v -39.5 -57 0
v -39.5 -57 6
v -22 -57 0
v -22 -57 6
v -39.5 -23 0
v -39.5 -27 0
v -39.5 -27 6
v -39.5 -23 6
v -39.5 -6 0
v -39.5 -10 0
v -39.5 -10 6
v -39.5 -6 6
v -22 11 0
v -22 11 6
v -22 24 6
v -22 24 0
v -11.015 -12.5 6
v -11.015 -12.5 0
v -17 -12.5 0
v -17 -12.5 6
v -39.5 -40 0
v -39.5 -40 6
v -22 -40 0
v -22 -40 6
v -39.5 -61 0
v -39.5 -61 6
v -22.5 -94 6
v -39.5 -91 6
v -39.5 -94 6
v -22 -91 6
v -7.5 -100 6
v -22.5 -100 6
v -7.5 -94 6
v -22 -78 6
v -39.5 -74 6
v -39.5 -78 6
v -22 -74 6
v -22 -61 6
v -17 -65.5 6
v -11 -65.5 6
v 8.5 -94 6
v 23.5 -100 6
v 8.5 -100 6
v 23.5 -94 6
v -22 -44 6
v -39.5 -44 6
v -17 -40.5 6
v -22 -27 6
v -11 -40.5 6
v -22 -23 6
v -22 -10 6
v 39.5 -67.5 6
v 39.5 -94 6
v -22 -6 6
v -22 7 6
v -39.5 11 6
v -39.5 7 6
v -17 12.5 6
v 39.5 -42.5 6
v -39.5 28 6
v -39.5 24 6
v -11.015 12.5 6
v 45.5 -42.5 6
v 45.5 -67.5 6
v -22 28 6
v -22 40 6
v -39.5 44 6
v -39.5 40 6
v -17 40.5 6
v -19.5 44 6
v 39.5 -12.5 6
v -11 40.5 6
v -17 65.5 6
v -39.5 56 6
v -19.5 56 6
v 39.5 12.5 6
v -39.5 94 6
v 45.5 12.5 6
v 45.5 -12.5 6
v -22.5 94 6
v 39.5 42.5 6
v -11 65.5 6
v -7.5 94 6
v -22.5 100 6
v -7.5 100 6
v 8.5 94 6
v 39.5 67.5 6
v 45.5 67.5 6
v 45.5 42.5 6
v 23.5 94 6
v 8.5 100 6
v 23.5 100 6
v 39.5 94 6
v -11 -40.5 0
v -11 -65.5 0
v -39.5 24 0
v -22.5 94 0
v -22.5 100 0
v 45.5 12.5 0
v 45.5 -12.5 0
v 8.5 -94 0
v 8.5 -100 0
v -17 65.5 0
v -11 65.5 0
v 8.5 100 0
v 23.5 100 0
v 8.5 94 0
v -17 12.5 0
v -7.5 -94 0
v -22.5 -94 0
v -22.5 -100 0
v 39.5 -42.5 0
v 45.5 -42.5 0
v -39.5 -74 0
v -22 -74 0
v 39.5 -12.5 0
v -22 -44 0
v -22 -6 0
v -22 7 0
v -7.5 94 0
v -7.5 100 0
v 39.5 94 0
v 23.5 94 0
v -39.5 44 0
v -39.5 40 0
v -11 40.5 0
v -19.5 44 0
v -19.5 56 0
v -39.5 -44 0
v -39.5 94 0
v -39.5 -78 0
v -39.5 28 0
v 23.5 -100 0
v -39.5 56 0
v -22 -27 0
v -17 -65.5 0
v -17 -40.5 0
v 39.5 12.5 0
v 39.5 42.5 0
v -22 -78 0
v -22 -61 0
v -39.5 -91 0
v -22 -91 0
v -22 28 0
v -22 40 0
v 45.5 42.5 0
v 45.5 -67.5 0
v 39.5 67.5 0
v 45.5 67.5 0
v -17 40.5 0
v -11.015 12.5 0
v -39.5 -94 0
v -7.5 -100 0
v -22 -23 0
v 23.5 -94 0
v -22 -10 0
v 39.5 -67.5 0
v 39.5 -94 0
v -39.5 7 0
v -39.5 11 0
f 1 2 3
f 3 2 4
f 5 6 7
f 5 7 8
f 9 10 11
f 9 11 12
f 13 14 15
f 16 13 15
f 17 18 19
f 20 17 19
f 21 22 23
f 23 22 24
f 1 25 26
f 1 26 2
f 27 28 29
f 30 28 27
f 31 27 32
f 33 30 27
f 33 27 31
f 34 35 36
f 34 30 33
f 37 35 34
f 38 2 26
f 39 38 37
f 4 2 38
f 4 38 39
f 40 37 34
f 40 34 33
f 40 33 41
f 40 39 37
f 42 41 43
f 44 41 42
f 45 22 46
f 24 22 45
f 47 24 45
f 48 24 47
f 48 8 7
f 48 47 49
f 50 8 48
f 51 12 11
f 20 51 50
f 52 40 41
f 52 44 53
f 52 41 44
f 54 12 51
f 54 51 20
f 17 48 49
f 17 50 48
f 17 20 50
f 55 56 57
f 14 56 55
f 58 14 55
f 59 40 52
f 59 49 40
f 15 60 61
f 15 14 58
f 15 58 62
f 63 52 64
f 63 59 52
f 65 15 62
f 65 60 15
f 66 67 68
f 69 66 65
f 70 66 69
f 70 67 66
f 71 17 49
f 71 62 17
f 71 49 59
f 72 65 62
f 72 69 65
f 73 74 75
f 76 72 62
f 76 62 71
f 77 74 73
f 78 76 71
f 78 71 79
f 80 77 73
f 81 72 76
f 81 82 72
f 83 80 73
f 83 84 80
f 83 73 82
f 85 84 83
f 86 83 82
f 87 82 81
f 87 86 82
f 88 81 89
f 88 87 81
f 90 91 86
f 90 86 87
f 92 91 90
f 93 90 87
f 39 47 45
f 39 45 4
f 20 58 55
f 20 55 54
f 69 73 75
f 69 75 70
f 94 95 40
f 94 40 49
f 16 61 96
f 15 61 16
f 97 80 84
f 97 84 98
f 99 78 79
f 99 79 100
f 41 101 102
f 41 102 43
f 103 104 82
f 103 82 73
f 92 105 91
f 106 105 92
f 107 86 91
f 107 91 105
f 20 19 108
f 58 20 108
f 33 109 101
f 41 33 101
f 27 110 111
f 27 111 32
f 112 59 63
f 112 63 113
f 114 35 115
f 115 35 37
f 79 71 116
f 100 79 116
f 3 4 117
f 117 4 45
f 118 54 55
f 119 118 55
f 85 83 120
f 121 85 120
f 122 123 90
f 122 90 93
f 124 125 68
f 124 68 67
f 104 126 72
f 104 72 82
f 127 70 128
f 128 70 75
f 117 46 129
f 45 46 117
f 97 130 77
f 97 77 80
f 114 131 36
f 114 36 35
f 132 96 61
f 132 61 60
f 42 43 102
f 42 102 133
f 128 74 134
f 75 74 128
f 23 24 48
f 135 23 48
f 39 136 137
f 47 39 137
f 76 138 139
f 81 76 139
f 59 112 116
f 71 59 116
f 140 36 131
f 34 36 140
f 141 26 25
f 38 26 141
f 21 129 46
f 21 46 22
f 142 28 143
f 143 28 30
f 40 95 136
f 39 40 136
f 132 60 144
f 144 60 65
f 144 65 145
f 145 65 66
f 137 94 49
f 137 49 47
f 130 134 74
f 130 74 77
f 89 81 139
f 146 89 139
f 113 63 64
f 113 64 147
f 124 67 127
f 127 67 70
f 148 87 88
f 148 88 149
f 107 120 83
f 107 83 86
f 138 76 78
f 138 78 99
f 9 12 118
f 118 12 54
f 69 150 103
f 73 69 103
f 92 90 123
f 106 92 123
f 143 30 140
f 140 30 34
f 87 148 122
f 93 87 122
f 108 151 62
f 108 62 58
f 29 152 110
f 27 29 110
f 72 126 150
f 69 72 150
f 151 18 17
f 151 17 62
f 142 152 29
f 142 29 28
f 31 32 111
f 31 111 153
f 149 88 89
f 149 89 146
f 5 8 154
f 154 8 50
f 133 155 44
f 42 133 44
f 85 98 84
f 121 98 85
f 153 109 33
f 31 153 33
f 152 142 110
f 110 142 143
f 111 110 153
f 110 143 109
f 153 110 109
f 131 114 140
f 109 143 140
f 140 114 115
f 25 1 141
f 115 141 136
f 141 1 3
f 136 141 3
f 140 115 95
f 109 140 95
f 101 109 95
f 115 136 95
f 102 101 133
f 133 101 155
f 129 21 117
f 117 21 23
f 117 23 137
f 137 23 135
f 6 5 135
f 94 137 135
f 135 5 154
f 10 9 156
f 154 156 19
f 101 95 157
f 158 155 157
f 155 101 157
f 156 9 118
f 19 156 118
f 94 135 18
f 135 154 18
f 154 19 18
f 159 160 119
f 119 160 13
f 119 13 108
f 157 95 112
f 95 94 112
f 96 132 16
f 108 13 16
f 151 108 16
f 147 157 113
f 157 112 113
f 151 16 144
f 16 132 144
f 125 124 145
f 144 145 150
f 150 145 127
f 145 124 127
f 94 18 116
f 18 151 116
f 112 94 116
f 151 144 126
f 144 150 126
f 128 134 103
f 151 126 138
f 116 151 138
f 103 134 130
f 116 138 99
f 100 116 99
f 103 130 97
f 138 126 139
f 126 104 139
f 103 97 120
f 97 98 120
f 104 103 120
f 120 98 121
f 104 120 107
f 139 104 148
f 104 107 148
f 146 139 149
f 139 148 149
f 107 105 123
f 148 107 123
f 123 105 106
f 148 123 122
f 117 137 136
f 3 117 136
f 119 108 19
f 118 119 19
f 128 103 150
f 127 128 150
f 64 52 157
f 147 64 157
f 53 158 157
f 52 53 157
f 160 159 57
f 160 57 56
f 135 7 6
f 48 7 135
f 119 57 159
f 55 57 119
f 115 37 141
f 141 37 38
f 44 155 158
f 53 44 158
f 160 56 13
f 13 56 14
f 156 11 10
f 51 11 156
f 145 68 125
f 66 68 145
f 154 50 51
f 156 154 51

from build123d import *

# Parameters (mm, degrees)
ESQUISSE1_W             = 79
ESQUISSE1_H             = 188
BOSS_EXTRU_1_DEPTH      = 6
ESQUISSE2_W             = 20
ESQUISSE2_H             = 12
ESQUISSE2_W_2           = 17.5
ESQUISSE2_H_2           = 13
ENL_V_MAT_EXTRU_1_DEPTH = 10
ESQUISSE3_W             = 6
ESQUISSE3_H             = 25
BOSS_EXTRU_2_DEPTH      = 6
ESQUISSE4_W             = 15
ESQUISSE4_H             = 6
BOSS_EXTRU_3_DEPTH      = 6
ESQUISSE5_W             = 15
ESQUISSE5_H             = 6
BOSS_EXTRU_4_DEPTH      = 6
ESQUISSE6_W             = 6
ESQUISSE6_H             = 25
ESQUISSE6_W_2           = 5.984999771
ESQUISSE6_W_3           = 6.000000529
ENL_V_MAT_EXTRU_2_DEPTH = 10


with BuildPart() as part:
    # Esquisse1 → Boss.-Extru.1 (new body)
    with BuildSketch(Plane.XY):
        Rectangle(ESQUISSE1_W, ESQUISSE1_H)
    extrude(amount=BOSS_EXTRU_1_DEPTH)

    # Esquisse2 → Enlèv. mat.-Extru.1 (cut)
    with BuildSketch(Plane.XY.offset(6)):
        with Locations((-29.5, 50)):
            Rectangle(ESQUISSE2_W, ESQUISSE2_H)
        with Locations((-30.75, 34)):
            Rectangle(ESQUISSE2_W_2, ESQUISSE2_H)
        with Locations((-30.75, 17.5)):
            Rectangle(ESQUISSE2_W_2, ESQUISSE2_H_2)
        with Locations((-30.75, 0.5)):
            Rectangle(ESQUISSE2_W_2, ESQUISSE2_H_2)
        with Locations((-30.75, -16.5)):
            Rectangle(ESQUISSE2_W_2, ESQUISSE2_H_2)
        with Locations((-30.75, -33.5)):
            Rectangle(ESQUISSE2_W_2, ESQUISSE2_H_2)
        with Locations((-30.75, -50.5)):
            Rectangle(ESQUISSE2_W_2, ESQUISSE2_H_2)
        with Locations((-30.75, -67.5)):
            Rectangle(ESQUISSE2_W_2, ESQUISSE2_H_2)
        with Locations((-30.75, -84.5)):
            Rectangle(ESQUISSE2_W_2, ESQUISSE2_H_2)
    extrude(amount=-ENL_V_MAT_EXTRU_1_DEPTH, mode=Mode.SUBTRACT)

    # Esquisse3 → Boss.-Extru.2 (add)
    with BuildSketch(Plane(origin=(39.5, 0, 0), x_dir=(0, 0, -1), z_dir=(1, 0, 0))):
        with Locations((-3, 55)):
            Rectangle(ESQUISSE3_W, ESQUISSE3_H)
        with Locations((-3, 0)):
            Rectangle(ESQUISSE3_W, ESQUISSE3_H)
        with Locations((-3, -55)):
            Rectangle(ESQUISSE3_W, ESQUISSE3_H)
    extrude(amount=BOSS_EXTRU_2_DEPTH)

    # Esquisse4 → Boss.-Extru.3 (add)
    with BuildSketch(Plane(origin=(0, 94, 0), x_dir=(1, 0, 0), z_dir=(0, 1, 0))):
        with Locations((-15, -3)):
            Rectangle(ESQUISSE4_W, ESQUISSE4_H)
        with Locations((16, -3)):
            Rectangle(ESQUISSE4_W, ESQUISSE4_H)
    extrude(amount=BOSS_EXTRU_3_DEPTH)

    # Esquisse5 → Boss.-Extru.4 (add)
    with BuildSketch(Plane.XZ.offset(94)):
        with Locations((16, 3)):
            Rectangle(ESQUISSE5_W, ESQUISSE5_H)
        with Locations((-15, 3)):
            Rectangle(ESQUISSE5_W, ESQUISSE5_H)
    extrude(amount=BOSS_EXTRU_4_DEPTH)

    # Esquisse6 → Enlèv. mat.-Extru.2 (cut)
    with BuildSketch(Plane(origin=(0, 0, 0), x_dir=(-1, 0, 0), z_dir=(0, 0, -1))):
        with Locations((14, -53)):
            Rectangle(ESQUISSE6_W, ESQUISSE6_H)
        with Locations((14.007500115, -4.018e-06)):
            Rectangle(ESQUISSE6_W_2, ESQUISSE6_H)
        with Locations((13.999999736, 52.999991964)):
            Rectangle(ESQUISSE6_W_3, ESQUISSE6_H)
    extrude(amount=-ENL_V_MAT_EXTRU_2_DEPTH, mode=Mode.SUBTRACT)


solid = part.part
